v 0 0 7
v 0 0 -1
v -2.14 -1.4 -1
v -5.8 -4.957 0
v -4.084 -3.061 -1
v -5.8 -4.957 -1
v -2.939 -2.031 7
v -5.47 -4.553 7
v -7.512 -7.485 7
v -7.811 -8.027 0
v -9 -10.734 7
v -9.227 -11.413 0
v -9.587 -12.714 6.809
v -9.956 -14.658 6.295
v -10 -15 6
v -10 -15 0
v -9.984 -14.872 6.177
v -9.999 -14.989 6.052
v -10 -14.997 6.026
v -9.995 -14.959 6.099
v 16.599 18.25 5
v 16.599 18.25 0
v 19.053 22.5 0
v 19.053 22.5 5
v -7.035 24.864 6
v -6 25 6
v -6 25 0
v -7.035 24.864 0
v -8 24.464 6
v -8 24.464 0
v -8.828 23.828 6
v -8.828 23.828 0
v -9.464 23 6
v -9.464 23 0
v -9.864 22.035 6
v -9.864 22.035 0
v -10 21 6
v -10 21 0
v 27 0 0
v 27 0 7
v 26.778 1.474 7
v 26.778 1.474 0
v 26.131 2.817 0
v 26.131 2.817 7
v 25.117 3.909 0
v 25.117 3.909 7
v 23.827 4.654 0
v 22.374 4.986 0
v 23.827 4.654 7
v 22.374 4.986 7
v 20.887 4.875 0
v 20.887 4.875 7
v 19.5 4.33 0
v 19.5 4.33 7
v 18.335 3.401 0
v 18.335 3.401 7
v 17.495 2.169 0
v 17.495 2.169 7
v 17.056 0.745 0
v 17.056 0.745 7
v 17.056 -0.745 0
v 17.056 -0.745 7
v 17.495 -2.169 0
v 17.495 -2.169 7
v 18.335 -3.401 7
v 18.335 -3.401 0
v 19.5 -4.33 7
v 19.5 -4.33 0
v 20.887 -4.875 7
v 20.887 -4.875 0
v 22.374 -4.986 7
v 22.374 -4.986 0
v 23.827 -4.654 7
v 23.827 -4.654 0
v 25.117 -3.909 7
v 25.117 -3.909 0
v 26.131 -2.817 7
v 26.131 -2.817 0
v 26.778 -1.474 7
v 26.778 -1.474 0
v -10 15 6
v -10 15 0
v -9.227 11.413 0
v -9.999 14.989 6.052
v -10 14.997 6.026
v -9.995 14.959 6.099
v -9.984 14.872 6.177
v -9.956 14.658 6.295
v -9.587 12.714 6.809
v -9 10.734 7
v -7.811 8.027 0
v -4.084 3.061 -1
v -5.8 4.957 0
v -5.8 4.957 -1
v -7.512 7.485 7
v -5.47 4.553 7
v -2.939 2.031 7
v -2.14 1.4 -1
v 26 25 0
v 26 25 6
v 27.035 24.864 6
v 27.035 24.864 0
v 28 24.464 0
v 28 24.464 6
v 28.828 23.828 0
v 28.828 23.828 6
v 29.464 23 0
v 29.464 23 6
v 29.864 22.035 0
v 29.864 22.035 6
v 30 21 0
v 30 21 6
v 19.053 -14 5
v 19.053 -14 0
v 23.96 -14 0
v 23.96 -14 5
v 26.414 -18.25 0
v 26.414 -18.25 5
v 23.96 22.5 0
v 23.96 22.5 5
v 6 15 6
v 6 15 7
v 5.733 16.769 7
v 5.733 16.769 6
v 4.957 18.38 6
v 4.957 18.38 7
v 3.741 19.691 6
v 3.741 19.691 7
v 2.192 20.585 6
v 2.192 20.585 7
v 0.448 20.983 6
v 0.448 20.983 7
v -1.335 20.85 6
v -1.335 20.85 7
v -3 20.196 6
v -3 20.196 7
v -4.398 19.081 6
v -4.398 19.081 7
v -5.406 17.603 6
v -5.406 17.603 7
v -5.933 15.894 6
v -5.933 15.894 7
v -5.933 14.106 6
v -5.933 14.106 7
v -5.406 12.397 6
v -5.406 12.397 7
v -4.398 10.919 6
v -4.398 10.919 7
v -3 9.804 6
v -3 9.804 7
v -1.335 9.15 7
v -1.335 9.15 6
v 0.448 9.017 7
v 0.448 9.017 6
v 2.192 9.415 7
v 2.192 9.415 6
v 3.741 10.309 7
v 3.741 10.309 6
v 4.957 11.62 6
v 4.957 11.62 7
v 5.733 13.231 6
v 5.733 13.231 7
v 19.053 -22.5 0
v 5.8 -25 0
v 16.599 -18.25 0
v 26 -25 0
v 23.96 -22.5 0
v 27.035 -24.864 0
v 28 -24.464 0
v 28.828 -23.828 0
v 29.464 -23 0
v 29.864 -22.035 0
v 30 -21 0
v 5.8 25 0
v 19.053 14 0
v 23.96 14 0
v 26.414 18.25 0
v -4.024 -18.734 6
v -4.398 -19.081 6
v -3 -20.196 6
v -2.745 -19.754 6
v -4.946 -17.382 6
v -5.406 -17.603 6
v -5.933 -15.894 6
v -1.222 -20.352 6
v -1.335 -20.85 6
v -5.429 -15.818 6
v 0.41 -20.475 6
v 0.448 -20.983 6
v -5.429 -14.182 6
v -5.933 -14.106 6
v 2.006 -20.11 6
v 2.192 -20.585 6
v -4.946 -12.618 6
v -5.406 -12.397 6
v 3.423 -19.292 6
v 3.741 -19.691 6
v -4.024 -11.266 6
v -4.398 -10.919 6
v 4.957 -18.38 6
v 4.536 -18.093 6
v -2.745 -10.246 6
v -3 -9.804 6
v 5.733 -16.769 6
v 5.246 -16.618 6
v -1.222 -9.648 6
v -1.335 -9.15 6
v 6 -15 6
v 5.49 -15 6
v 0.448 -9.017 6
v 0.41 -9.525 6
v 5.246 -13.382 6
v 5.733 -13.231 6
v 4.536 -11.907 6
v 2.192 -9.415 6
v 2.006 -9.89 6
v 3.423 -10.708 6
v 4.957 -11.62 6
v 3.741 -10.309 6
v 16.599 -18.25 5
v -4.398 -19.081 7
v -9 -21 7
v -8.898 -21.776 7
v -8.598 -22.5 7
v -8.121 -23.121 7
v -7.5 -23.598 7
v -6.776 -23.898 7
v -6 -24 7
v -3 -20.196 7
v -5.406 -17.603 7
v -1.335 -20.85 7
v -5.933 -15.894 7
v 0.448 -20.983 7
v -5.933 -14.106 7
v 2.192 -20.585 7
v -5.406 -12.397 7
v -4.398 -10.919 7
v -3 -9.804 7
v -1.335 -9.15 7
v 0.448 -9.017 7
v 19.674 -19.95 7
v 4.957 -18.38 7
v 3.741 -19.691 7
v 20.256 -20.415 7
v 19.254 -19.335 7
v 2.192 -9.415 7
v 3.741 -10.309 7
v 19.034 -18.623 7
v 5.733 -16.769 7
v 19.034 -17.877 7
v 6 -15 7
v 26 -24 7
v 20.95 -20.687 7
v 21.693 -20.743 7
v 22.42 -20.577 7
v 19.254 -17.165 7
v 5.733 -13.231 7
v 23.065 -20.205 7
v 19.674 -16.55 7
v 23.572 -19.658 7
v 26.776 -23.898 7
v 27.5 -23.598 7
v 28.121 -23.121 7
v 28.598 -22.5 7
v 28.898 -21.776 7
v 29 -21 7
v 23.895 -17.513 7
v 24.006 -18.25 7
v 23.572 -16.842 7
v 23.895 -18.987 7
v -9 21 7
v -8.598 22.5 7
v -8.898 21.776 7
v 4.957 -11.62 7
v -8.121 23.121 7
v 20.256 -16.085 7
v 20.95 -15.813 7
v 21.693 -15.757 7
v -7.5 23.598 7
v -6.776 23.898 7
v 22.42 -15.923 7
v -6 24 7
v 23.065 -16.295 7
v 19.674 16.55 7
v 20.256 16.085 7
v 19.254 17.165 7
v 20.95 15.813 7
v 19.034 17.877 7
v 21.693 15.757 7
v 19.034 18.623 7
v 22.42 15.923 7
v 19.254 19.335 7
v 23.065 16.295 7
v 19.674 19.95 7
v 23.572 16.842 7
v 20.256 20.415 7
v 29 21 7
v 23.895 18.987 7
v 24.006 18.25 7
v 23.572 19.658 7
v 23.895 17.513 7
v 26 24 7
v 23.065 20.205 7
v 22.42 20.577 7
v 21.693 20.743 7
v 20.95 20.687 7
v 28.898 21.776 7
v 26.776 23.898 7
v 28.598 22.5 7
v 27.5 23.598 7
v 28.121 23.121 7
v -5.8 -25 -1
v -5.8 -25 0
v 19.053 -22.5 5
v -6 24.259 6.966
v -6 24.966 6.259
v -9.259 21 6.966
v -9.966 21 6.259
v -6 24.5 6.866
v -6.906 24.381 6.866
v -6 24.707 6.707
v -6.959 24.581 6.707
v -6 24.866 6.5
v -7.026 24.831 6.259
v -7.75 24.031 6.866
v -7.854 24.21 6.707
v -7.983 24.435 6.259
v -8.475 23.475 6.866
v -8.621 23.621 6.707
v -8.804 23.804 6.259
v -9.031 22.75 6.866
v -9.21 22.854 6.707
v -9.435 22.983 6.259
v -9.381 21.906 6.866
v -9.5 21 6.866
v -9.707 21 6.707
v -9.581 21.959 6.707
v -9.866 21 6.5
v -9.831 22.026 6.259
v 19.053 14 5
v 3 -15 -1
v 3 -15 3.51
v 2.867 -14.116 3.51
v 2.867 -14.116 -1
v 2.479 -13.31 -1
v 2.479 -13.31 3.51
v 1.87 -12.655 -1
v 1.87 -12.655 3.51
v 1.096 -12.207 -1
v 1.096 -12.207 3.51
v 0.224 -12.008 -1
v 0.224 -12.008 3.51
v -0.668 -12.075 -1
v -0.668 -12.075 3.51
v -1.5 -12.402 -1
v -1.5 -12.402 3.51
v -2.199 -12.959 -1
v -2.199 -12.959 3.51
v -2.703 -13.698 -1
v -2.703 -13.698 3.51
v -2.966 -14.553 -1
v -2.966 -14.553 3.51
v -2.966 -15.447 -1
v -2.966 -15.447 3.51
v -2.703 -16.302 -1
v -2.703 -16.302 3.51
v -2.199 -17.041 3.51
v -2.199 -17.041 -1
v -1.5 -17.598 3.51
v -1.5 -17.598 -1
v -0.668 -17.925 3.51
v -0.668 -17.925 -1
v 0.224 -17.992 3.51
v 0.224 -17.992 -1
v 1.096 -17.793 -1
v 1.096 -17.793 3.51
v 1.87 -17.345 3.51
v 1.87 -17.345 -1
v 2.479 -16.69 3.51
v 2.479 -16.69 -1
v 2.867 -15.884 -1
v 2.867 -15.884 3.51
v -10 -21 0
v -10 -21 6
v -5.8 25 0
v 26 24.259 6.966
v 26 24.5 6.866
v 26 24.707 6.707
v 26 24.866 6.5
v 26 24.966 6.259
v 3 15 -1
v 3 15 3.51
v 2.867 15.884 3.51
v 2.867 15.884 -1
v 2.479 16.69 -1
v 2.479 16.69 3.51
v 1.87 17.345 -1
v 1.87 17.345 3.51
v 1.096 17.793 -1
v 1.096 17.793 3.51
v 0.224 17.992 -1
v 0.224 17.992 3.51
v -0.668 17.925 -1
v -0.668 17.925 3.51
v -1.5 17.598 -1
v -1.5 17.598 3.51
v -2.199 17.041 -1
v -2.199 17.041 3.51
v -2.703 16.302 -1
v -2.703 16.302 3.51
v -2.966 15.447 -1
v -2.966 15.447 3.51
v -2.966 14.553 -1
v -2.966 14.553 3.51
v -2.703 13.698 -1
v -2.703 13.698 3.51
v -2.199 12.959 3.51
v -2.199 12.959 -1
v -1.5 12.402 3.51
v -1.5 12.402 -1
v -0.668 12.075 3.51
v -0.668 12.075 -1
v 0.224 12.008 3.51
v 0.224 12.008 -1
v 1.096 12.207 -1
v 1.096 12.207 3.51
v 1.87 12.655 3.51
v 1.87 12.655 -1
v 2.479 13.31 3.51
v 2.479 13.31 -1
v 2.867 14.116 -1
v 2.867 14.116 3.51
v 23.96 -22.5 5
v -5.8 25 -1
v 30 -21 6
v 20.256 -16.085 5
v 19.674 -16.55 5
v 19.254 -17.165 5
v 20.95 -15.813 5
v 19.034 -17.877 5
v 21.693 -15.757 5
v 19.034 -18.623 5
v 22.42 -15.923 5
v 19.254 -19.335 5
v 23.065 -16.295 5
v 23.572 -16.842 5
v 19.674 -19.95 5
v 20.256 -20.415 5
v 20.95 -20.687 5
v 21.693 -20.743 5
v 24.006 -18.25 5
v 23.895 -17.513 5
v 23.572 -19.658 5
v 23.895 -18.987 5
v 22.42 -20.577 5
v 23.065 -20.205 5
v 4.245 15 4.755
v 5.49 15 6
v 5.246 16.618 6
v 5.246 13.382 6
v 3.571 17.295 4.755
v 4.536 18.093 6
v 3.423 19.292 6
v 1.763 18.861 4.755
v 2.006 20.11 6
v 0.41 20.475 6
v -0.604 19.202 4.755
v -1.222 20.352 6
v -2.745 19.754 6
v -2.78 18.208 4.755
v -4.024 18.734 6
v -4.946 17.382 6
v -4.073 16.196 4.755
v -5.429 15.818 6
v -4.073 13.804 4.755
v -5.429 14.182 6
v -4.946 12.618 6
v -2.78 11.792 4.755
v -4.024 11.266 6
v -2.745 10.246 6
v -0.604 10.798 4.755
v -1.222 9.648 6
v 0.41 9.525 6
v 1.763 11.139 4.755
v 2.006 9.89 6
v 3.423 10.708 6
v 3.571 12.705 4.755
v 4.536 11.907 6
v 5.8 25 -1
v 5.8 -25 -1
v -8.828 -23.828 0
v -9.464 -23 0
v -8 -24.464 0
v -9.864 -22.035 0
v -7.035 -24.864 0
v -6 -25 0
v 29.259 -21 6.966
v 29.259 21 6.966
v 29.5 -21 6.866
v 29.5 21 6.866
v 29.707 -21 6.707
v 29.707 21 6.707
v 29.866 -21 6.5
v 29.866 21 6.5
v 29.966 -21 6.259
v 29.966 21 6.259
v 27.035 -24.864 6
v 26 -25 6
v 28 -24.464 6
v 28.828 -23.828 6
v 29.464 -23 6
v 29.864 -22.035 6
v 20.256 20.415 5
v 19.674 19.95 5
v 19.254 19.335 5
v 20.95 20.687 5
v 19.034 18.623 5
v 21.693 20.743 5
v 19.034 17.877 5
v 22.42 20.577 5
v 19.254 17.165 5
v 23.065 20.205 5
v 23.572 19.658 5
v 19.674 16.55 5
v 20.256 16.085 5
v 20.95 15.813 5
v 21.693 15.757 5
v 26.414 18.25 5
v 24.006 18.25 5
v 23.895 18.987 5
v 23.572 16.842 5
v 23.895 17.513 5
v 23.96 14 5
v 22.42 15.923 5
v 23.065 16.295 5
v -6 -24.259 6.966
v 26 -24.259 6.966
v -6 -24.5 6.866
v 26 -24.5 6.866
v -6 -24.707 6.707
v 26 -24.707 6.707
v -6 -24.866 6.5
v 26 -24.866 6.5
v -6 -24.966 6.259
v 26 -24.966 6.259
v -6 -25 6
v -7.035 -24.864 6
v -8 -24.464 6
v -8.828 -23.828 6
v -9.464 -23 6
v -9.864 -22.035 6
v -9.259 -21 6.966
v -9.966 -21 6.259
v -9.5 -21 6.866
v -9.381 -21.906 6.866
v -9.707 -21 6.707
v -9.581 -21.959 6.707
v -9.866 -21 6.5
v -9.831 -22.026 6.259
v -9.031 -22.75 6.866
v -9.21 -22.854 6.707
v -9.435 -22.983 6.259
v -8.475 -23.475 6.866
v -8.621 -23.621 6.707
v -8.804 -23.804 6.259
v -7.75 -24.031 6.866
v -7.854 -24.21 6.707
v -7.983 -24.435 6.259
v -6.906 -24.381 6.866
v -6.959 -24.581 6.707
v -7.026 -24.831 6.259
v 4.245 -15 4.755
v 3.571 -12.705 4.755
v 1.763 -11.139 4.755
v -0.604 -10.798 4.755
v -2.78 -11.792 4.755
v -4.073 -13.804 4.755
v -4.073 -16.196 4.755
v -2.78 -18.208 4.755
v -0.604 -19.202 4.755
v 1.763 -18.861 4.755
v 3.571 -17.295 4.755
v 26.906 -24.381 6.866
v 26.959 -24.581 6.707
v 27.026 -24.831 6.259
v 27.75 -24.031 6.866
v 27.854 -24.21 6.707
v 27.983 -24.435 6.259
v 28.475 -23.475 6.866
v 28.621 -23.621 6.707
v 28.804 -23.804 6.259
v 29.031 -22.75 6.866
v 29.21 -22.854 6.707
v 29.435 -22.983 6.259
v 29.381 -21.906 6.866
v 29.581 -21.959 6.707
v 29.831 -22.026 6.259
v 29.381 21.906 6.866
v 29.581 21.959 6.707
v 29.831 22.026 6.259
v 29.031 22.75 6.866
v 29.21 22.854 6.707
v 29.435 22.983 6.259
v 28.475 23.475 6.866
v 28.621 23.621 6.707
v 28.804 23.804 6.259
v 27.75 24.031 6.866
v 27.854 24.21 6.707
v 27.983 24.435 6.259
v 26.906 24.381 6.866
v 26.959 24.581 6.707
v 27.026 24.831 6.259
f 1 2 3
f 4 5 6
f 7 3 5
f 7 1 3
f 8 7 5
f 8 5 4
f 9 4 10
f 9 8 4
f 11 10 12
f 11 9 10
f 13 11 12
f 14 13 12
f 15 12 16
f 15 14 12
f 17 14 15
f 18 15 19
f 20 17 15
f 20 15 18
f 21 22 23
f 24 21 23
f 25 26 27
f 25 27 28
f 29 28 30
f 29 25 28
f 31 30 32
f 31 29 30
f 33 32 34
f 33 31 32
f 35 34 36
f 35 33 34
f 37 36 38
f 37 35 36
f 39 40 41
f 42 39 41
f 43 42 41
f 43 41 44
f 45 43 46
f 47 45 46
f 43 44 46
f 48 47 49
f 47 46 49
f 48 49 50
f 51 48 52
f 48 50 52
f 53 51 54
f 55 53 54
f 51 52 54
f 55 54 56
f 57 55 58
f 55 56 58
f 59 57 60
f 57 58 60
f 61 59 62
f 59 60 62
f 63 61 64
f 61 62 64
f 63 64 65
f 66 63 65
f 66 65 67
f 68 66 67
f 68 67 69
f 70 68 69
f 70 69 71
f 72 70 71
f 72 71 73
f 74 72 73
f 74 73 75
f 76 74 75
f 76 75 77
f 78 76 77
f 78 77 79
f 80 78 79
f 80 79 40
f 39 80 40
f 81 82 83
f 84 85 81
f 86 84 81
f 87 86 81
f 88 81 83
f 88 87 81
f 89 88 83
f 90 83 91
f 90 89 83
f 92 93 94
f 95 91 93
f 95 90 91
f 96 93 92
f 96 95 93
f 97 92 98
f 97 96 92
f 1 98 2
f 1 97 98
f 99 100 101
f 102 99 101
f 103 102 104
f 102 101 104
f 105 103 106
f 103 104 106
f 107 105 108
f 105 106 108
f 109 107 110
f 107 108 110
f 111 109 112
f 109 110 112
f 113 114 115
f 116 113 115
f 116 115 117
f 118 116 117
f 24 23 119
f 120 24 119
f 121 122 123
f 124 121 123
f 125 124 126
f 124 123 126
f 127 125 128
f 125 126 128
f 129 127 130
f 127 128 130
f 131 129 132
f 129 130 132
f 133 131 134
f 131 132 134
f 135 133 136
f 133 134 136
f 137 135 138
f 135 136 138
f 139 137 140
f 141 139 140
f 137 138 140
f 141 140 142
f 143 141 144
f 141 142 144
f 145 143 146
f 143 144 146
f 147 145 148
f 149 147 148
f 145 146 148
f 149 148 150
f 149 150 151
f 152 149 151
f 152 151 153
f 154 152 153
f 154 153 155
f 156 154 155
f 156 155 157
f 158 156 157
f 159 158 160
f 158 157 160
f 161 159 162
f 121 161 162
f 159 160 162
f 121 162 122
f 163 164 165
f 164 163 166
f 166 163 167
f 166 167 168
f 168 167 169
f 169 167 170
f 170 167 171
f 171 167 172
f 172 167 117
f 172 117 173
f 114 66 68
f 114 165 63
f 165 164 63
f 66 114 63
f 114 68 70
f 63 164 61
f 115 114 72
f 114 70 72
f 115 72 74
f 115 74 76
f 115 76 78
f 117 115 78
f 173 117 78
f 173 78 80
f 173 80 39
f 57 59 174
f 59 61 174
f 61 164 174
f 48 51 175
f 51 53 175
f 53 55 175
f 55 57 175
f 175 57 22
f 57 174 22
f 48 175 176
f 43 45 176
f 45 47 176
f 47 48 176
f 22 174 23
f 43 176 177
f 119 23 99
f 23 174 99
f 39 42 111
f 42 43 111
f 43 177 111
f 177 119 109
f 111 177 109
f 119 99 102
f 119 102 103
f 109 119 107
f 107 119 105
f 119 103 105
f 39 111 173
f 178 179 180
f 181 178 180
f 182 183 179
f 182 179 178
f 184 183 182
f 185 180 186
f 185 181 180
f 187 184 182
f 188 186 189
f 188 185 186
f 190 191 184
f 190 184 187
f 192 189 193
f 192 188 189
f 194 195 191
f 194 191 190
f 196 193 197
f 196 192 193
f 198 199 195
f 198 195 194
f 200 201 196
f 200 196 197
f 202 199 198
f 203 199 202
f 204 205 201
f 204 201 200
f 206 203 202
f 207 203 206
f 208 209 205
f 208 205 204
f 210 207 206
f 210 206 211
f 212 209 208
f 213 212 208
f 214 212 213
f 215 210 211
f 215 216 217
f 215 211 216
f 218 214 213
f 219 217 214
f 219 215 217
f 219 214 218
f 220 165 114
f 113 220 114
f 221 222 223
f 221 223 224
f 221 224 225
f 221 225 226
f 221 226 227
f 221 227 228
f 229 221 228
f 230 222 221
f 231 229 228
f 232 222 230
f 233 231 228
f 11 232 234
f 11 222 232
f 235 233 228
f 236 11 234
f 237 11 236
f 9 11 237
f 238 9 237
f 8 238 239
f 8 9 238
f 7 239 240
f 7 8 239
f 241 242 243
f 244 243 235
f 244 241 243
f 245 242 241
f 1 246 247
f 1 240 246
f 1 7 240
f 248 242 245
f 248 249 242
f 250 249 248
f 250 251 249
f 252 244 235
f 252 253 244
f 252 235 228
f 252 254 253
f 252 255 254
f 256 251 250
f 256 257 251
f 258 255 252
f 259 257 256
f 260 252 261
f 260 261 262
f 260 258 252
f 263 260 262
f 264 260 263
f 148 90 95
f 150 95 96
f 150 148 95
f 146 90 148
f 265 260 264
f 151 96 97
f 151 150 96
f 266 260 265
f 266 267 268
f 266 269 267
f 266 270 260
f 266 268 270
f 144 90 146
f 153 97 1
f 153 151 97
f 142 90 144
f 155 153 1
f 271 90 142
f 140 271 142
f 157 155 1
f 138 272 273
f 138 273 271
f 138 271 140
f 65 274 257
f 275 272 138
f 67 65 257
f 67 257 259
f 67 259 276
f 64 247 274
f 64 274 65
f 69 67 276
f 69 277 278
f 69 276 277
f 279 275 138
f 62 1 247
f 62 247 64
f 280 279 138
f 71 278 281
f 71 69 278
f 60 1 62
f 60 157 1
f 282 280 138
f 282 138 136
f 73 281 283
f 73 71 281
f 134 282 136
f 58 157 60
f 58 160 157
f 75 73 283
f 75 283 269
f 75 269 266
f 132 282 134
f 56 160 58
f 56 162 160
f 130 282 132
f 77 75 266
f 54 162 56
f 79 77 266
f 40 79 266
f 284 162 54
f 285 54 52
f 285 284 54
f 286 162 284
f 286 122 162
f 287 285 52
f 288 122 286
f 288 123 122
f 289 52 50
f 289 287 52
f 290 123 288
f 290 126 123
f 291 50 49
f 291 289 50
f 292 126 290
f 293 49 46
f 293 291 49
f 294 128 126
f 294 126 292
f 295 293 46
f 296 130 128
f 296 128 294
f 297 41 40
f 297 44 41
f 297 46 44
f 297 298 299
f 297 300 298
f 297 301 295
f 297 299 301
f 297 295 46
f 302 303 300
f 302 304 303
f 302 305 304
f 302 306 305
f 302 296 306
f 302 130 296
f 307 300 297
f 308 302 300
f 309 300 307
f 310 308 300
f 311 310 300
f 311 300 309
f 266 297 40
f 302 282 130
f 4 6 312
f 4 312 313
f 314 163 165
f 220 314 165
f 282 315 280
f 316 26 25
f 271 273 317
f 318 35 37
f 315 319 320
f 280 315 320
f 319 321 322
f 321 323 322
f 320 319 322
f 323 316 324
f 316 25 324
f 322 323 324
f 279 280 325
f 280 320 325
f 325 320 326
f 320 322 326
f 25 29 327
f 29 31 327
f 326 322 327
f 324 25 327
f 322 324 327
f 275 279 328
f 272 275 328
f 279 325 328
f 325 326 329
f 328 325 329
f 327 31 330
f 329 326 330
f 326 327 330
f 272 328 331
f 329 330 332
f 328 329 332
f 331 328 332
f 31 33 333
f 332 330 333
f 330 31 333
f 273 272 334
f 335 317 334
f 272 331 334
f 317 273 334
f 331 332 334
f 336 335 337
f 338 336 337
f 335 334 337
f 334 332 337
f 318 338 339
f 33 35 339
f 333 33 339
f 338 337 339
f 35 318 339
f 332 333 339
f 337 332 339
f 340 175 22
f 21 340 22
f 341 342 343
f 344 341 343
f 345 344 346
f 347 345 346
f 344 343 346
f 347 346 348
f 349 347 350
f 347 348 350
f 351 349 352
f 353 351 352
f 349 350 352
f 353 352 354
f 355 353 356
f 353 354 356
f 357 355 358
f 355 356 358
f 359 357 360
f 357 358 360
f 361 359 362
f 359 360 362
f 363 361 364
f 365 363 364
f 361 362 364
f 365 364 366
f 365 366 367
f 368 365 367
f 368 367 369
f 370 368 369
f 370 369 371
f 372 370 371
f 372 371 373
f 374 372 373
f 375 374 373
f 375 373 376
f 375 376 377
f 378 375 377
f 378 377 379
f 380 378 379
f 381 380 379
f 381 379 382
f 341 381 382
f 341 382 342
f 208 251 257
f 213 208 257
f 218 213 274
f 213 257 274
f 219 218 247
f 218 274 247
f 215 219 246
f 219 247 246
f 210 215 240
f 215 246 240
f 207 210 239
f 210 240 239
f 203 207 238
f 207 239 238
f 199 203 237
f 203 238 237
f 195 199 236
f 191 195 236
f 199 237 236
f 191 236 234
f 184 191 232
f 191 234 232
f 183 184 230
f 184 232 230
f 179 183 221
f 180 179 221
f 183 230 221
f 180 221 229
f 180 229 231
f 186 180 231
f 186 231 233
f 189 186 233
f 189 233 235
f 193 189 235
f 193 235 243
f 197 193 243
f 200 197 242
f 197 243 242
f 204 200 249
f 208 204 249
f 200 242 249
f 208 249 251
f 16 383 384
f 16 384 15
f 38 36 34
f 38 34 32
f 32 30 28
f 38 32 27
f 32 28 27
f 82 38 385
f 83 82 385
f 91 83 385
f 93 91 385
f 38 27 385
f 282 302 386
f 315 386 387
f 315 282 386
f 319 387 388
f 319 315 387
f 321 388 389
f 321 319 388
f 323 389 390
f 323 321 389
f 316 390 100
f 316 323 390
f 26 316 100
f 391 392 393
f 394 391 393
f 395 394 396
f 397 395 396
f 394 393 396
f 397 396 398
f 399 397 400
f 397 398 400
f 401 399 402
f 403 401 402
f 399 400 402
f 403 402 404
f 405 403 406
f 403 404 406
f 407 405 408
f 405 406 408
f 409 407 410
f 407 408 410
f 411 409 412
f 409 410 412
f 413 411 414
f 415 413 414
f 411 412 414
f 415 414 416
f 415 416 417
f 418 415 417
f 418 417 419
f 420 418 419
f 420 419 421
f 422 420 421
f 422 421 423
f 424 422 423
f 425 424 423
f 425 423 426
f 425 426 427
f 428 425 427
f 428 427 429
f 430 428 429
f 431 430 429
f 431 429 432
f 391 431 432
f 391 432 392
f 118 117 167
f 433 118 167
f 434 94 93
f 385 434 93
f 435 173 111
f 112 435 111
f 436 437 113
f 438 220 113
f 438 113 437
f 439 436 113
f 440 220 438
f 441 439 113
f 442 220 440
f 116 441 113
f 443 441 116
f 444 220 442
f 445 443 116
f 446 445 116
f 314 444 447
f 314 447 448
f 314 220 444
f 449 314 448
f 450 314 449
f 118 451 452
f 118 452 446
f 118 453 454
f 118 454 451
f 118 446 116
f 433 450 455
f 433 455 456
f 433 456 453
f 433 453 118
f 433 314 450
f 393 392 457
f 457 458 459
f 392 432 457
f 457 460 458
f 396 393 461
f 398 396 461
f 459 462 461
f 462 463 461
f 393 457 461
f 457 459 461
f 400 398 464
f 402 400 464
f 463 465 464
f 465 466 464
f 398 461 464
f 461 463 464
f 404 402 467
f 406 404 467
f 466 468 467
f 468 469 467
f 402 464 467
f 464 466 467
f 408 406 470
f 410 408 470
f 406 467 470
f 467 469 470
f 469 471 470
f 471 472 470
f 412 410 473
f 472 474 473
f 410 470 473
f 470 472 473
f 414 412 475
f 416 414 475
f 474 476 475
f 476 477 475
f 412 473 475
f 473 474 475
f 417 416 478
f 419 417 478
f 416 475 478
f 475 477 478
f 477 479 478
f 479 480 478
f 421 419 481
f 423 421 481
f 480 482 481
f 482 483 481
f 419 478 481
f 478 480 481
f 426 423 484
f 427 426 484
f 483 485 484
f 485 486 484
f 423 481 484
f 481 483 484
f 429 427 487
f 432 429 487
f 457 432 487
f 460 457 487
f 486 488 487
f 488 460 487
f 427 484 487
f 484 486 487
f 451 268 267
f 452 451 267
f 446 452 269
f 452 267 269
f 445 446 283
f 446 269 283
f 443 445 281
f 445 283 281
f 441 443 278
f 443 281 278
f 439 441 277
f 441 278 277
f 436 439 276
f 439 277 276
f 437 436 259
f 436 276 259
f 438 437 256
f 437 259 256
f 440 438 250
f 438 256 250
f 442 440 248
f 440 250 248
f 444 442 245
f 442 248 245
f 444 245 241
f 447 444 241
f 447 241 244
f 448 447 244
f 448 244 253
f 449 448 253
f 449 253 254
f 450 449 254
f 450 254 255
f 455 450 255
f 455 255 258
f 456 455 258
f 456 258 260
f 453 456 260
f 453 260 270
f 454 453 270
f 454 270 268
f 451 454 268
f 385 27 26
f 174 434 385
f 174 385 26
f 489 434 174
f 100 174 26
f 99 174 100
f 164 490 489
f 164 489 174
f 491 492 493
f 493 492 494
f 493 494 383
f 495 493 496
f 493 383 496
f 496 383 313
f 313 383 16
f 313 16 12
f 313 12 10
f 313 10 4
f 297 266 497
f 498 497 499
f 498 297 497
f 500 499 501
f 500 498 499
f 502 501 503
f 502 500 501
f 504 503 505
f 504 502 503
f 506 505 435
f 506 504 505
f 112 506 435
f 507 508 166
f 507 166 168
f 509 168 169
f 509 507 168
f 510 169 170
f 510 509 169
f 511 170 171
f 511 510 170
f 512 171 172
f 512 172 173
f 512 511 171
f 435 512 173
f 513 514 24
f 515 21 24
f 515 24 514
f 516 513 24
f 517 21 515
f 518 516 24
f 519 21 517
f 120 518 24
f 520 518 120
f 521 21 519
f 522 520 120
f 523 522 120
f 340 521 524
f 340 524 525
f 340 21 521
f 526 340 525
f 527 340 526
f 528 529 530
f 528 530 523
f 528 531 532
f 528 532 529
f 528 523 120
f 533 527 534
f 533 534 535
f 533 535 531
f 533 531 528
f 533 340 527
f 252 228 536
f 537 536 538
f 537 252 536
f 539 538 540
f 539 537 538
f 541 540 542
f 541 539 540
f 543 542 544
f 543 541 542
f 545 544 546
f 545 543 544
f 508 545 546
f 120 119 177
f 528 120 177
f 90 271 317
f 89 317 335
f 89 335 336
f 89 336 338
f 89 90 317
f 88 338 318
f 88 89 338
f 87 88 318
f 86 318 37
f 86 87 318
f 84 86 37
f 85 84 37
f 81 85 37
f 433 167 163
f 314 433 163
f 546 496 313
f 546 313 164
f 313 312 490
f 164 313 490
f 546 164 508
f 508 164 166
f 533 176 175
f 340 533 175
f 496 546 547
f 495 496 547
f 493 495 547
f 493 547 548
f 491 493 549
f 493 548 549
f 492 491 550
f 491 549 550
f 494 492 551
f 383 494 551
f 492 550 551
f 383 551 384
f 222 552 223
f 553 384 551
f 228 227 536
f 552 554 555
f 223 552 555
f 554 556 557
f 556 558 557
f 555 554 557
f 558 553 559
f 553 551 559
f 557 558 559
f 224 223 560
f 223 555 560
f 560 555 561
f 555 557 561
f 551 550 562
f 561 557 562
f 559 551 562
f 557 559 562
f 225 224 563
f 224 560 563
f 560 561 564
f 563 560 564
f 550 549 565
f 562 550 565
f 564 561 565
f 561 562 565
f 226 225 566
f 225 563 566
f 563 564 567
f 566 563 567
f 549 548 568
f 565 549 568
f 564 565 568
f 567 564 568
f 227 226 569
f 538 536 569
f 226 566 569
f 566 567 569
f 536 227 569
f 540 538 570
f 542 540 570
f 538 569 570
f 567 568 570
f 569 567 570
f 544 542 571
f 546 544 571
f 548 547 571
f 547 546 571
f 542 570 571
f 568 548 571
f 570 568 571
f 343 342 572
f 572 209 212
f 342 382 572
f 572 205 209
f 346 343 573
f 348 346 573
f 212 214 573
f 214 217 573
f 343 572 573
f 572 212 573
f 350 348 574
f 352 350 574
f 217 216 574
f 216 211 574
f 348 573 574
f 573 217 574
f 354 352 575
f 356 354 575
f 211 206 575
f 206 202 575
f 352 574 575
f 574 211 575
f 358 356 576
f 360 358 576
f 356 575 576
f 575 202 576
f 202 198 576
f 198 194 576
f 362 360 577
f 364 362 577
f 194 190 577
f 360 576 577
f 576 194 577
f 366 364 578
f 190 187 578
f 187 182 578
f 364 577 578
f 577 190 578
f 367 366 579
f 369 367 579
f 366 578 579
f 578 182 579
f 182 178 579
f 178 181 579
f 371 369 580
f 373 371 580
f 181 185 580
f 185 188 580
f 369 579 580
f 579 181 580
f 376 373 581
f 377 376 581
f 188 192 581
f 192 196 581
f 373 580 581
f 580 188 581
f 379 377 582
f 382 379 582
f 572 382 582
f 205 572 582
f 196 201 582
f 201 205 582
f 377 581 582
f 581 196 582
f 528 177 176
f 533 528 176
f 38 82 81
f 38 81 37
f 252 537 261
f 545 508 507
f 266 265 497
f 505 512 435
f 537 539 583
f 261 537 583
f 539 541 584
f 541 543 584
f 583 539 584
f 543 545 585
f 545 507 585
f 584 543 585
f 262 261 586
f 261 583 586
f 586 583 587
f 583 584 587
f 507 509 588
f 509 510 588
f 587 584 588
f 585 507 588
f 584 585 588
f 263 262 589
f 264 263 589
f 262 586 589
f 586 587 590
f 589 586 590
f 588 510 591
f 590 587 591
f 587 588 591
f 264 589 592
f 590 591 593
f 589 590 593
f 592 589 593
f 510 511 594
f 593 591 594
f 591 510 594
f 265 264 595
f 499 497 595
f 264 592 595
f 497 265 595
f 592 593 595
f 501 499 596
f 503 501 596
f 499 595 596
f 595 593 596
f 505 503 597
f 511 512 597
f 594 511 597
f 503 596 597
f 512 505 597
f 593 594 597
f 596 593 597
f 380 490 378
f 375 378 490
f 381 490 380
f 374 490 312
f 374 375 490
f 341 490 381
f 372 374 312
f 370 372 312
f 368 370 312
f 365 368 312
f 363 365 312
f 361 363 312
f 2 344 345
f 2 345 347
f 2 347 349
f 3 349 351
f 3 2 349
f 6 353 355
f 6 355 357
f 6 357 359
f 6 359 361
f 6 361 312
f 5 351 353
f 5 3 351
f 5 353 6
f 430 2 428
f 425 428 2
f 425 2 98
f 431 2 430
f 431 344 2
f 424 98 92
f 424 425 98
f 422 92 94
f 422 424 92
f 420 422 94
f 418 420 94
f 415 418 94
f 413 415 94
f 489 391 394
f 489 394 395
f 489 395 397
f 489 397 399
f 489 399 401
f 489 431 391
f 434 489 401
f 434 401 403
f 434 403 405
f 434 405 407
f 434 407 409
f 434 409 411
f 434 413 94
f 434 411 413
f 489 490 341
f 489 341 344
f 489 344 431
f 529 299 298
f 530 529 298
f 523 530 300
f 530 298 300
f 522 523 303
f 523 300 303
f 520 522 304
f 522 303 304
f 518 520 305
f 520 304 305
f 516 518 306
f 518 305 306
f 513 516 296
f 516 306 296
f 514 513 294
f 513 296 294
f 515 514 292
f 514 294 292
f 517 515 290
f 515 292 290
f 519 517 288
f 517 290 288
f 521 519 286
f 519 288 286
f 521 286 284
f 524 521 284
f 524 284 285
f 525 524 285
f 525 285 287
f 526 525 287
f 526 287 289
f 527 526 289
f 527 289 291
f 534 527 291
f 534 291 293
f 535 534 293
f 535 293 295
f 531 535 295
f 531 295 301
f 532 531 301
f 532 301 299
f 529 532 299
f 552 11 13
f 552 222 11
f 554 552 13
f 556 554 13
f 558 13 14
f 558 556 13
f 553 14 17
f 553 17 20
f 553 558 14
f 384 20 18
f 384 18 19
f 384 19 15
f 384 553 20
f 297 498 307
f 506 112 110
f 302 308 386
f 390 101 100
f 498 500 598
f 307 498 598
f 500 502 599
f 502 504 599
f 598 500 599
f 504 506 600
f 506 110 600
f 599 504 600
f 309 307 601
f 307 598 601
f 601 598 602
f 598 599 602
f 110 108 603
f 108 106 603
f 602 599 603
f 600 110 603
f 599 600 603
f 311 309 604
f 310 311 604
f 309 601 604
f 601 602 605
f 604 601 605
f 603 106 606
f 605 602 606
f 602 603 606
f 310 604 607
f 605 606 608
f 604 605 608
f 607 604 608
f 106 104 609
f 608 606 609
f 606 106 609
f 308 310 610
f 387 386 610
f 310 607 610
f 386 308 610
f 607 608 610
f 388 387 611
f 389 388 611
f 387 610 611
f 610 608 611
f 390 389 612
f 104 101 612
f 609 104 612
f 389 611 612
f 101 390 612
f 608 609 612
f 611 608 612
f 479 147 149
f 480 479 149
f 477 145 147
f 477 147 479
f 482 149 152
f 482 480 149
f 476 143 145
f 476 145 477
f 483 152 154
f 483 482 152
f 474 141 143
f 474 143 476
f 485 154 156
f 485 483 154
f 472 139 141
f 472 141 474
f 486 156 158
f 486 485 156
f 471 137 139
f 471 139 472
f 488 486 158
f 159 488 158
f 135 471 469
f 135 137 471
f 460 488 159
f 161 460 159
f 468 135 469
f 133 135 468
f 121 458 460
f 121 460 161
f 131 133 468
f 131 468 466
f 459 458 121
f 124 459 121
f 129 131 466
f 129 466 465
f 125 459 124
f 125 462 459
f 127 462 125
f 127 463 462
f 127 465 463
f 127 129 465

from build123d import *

# Parameters (mm, degrees)
SKETCH_W        = 40
SKETCH_H        = 50
PAD_DEPTH       = 7
SKETCH001_R     = 2.5
SKETCH001_R_2   = 5
POCKET_DEPTH    = 7.001
POCKET001_DEPTH = 5
SKETCH003_W     = 11.6
SKETCH003_H     = 1
PAD001_DEPTH    = 50
SKETCH004_R     = 3
POCKET002_DEPTH = 8.001
SKETCH005_R     = 6
POCKET003_DEPTH = 1
CHAMFER_SIZE    = 2.49
FILLET_R        = 4
POCKET004_DEPTH = 8.001
FILLET001_R     = 1


with BuildPart() as part:
    # Sketch → Pad (new body)
    with BuildSketch(Plane.XY):
        with Locations((10, 0)):
            Rectangle(SKETCH_W, SKETCH_H)
    extrude(amount=PAD_DEPTH)

    # Sketch001 (on Face6 of Pad) → Pocket (cut, through all)
    with BuildSketch(Plane.XY.offset(7)):
        with Locations((21.50647, 18.25)):
            Circle(SKETCH001_R)
        with Locations((21.50647, -18.25)):
            Circle(SKETCH001_R)
        with Locations((22, 0)):
            Circle(SKETCH001_R_2)
    extrude(amount=-POCKET_DEPTH, mode=Mode.SUBTRACT)

    # Sketch002 (on Face4 of Pocket) → Pocket001 (cut)
    with BuildSketch(Plane(origin=(0, 0, 0), x_dir=(1, 0, 0), z_dir=(0, 0, -1))):
        Polygon((19.052731, 14), (23.960208, 14), (26.413947, 18.25), (23.960208, 22.5), (19.052731, 22.5), (16.598992, 18.25), align=None)
        Polygon((19.052731, -22.5), (23.960208, -22.5), (26.413947, -18.25), (23.960208, -14), (19.052731, -14), (16.598992, -18.25), align=None)
    extrude(amount=-POCKET001_DEPTH, mode=Mode.SUBTRACT)

    # Sketch003 (on Face1 of Pocket001) → Pad001 (join)
    with BuildSketch(Plane(origin=(0, 25, 0), x_dir=(-1, 0, 0), z_dir=(0, 1, 0))):
        with Locations((0, -0.5)):
            Rectangle(SKETCH003_W, SKETCH003_H)
    extrude(amount=-PAD001_DEPTH)

    # Sketch004 (on Face5 of Pad001) → Pocket002 (cut, through all)
    with BuildSketch(Plane.XY.offset(7)):
        with Locations((0, 15)):
            Circle(SKETCH004_R)
        with Locations((0, -15)):
            Circle(SKETCH004_R)
    extrude(amount=-POCKET002_DEPTH, mode=Mode.SUBTRACT)

    # Sketch005 (on Face5 of Pocket002) → Pocket003 (cut)
    with BuildSketch(Plane.XY.offset(7)):
        with Locations((0, 15)):
            Circle(SKETCH005_R)
        with Locations((0, -15)):
            Circle(SKETCH005_R)
    extrude(amount=-POCKET003_DEPTH, mode=Mode.SUBTRACT)

    # Chamfer
    chamfer_edges = [part.edges().sort_by_distance(p)[0] for p in [
        (-3, -15, 6),
        (-3, 15, 6),
    ]]
    chamfer(chamfer_edges, length=CHAMFER_SIZE)

    # Fillet
    fillet_edges = [part.edges().sort_by_distance(p)[0] for p in [
        (-10, -25, 3.5),
        (30, -25, 3.5),
        (30, 25, 3.5),
        (-10, 25, 3.5),
    ]]
    fillet(fillet_edges, radius=FILLET_R)

    # Sketch006 (on Face1 of Fillet) → Pocket004 (cut, through all)
    with BuildSketch(Plane.XY.offset(7)):
        with BuildLine():
            ThreePointArc((-10, 15), (-6.785937, 6.309375), (0, 0))
            ThreePointArc((0, 0), (-6.785937, -6.309375), (-10, -15))
            Line((-10, 15), (-10, -15))
        make_face()
    extrude(amount=-POCKET004_DEPTH, mode=Mode.SUBTRACT)

    # Fillet001
    fillet001_edges = [part.edges().sort_by_distance(p)[0] for p in [
        (30, 0, 7),
    ]]
    fillet(fillet001_edges, radius=FILLET001_R)


solid = part.part
